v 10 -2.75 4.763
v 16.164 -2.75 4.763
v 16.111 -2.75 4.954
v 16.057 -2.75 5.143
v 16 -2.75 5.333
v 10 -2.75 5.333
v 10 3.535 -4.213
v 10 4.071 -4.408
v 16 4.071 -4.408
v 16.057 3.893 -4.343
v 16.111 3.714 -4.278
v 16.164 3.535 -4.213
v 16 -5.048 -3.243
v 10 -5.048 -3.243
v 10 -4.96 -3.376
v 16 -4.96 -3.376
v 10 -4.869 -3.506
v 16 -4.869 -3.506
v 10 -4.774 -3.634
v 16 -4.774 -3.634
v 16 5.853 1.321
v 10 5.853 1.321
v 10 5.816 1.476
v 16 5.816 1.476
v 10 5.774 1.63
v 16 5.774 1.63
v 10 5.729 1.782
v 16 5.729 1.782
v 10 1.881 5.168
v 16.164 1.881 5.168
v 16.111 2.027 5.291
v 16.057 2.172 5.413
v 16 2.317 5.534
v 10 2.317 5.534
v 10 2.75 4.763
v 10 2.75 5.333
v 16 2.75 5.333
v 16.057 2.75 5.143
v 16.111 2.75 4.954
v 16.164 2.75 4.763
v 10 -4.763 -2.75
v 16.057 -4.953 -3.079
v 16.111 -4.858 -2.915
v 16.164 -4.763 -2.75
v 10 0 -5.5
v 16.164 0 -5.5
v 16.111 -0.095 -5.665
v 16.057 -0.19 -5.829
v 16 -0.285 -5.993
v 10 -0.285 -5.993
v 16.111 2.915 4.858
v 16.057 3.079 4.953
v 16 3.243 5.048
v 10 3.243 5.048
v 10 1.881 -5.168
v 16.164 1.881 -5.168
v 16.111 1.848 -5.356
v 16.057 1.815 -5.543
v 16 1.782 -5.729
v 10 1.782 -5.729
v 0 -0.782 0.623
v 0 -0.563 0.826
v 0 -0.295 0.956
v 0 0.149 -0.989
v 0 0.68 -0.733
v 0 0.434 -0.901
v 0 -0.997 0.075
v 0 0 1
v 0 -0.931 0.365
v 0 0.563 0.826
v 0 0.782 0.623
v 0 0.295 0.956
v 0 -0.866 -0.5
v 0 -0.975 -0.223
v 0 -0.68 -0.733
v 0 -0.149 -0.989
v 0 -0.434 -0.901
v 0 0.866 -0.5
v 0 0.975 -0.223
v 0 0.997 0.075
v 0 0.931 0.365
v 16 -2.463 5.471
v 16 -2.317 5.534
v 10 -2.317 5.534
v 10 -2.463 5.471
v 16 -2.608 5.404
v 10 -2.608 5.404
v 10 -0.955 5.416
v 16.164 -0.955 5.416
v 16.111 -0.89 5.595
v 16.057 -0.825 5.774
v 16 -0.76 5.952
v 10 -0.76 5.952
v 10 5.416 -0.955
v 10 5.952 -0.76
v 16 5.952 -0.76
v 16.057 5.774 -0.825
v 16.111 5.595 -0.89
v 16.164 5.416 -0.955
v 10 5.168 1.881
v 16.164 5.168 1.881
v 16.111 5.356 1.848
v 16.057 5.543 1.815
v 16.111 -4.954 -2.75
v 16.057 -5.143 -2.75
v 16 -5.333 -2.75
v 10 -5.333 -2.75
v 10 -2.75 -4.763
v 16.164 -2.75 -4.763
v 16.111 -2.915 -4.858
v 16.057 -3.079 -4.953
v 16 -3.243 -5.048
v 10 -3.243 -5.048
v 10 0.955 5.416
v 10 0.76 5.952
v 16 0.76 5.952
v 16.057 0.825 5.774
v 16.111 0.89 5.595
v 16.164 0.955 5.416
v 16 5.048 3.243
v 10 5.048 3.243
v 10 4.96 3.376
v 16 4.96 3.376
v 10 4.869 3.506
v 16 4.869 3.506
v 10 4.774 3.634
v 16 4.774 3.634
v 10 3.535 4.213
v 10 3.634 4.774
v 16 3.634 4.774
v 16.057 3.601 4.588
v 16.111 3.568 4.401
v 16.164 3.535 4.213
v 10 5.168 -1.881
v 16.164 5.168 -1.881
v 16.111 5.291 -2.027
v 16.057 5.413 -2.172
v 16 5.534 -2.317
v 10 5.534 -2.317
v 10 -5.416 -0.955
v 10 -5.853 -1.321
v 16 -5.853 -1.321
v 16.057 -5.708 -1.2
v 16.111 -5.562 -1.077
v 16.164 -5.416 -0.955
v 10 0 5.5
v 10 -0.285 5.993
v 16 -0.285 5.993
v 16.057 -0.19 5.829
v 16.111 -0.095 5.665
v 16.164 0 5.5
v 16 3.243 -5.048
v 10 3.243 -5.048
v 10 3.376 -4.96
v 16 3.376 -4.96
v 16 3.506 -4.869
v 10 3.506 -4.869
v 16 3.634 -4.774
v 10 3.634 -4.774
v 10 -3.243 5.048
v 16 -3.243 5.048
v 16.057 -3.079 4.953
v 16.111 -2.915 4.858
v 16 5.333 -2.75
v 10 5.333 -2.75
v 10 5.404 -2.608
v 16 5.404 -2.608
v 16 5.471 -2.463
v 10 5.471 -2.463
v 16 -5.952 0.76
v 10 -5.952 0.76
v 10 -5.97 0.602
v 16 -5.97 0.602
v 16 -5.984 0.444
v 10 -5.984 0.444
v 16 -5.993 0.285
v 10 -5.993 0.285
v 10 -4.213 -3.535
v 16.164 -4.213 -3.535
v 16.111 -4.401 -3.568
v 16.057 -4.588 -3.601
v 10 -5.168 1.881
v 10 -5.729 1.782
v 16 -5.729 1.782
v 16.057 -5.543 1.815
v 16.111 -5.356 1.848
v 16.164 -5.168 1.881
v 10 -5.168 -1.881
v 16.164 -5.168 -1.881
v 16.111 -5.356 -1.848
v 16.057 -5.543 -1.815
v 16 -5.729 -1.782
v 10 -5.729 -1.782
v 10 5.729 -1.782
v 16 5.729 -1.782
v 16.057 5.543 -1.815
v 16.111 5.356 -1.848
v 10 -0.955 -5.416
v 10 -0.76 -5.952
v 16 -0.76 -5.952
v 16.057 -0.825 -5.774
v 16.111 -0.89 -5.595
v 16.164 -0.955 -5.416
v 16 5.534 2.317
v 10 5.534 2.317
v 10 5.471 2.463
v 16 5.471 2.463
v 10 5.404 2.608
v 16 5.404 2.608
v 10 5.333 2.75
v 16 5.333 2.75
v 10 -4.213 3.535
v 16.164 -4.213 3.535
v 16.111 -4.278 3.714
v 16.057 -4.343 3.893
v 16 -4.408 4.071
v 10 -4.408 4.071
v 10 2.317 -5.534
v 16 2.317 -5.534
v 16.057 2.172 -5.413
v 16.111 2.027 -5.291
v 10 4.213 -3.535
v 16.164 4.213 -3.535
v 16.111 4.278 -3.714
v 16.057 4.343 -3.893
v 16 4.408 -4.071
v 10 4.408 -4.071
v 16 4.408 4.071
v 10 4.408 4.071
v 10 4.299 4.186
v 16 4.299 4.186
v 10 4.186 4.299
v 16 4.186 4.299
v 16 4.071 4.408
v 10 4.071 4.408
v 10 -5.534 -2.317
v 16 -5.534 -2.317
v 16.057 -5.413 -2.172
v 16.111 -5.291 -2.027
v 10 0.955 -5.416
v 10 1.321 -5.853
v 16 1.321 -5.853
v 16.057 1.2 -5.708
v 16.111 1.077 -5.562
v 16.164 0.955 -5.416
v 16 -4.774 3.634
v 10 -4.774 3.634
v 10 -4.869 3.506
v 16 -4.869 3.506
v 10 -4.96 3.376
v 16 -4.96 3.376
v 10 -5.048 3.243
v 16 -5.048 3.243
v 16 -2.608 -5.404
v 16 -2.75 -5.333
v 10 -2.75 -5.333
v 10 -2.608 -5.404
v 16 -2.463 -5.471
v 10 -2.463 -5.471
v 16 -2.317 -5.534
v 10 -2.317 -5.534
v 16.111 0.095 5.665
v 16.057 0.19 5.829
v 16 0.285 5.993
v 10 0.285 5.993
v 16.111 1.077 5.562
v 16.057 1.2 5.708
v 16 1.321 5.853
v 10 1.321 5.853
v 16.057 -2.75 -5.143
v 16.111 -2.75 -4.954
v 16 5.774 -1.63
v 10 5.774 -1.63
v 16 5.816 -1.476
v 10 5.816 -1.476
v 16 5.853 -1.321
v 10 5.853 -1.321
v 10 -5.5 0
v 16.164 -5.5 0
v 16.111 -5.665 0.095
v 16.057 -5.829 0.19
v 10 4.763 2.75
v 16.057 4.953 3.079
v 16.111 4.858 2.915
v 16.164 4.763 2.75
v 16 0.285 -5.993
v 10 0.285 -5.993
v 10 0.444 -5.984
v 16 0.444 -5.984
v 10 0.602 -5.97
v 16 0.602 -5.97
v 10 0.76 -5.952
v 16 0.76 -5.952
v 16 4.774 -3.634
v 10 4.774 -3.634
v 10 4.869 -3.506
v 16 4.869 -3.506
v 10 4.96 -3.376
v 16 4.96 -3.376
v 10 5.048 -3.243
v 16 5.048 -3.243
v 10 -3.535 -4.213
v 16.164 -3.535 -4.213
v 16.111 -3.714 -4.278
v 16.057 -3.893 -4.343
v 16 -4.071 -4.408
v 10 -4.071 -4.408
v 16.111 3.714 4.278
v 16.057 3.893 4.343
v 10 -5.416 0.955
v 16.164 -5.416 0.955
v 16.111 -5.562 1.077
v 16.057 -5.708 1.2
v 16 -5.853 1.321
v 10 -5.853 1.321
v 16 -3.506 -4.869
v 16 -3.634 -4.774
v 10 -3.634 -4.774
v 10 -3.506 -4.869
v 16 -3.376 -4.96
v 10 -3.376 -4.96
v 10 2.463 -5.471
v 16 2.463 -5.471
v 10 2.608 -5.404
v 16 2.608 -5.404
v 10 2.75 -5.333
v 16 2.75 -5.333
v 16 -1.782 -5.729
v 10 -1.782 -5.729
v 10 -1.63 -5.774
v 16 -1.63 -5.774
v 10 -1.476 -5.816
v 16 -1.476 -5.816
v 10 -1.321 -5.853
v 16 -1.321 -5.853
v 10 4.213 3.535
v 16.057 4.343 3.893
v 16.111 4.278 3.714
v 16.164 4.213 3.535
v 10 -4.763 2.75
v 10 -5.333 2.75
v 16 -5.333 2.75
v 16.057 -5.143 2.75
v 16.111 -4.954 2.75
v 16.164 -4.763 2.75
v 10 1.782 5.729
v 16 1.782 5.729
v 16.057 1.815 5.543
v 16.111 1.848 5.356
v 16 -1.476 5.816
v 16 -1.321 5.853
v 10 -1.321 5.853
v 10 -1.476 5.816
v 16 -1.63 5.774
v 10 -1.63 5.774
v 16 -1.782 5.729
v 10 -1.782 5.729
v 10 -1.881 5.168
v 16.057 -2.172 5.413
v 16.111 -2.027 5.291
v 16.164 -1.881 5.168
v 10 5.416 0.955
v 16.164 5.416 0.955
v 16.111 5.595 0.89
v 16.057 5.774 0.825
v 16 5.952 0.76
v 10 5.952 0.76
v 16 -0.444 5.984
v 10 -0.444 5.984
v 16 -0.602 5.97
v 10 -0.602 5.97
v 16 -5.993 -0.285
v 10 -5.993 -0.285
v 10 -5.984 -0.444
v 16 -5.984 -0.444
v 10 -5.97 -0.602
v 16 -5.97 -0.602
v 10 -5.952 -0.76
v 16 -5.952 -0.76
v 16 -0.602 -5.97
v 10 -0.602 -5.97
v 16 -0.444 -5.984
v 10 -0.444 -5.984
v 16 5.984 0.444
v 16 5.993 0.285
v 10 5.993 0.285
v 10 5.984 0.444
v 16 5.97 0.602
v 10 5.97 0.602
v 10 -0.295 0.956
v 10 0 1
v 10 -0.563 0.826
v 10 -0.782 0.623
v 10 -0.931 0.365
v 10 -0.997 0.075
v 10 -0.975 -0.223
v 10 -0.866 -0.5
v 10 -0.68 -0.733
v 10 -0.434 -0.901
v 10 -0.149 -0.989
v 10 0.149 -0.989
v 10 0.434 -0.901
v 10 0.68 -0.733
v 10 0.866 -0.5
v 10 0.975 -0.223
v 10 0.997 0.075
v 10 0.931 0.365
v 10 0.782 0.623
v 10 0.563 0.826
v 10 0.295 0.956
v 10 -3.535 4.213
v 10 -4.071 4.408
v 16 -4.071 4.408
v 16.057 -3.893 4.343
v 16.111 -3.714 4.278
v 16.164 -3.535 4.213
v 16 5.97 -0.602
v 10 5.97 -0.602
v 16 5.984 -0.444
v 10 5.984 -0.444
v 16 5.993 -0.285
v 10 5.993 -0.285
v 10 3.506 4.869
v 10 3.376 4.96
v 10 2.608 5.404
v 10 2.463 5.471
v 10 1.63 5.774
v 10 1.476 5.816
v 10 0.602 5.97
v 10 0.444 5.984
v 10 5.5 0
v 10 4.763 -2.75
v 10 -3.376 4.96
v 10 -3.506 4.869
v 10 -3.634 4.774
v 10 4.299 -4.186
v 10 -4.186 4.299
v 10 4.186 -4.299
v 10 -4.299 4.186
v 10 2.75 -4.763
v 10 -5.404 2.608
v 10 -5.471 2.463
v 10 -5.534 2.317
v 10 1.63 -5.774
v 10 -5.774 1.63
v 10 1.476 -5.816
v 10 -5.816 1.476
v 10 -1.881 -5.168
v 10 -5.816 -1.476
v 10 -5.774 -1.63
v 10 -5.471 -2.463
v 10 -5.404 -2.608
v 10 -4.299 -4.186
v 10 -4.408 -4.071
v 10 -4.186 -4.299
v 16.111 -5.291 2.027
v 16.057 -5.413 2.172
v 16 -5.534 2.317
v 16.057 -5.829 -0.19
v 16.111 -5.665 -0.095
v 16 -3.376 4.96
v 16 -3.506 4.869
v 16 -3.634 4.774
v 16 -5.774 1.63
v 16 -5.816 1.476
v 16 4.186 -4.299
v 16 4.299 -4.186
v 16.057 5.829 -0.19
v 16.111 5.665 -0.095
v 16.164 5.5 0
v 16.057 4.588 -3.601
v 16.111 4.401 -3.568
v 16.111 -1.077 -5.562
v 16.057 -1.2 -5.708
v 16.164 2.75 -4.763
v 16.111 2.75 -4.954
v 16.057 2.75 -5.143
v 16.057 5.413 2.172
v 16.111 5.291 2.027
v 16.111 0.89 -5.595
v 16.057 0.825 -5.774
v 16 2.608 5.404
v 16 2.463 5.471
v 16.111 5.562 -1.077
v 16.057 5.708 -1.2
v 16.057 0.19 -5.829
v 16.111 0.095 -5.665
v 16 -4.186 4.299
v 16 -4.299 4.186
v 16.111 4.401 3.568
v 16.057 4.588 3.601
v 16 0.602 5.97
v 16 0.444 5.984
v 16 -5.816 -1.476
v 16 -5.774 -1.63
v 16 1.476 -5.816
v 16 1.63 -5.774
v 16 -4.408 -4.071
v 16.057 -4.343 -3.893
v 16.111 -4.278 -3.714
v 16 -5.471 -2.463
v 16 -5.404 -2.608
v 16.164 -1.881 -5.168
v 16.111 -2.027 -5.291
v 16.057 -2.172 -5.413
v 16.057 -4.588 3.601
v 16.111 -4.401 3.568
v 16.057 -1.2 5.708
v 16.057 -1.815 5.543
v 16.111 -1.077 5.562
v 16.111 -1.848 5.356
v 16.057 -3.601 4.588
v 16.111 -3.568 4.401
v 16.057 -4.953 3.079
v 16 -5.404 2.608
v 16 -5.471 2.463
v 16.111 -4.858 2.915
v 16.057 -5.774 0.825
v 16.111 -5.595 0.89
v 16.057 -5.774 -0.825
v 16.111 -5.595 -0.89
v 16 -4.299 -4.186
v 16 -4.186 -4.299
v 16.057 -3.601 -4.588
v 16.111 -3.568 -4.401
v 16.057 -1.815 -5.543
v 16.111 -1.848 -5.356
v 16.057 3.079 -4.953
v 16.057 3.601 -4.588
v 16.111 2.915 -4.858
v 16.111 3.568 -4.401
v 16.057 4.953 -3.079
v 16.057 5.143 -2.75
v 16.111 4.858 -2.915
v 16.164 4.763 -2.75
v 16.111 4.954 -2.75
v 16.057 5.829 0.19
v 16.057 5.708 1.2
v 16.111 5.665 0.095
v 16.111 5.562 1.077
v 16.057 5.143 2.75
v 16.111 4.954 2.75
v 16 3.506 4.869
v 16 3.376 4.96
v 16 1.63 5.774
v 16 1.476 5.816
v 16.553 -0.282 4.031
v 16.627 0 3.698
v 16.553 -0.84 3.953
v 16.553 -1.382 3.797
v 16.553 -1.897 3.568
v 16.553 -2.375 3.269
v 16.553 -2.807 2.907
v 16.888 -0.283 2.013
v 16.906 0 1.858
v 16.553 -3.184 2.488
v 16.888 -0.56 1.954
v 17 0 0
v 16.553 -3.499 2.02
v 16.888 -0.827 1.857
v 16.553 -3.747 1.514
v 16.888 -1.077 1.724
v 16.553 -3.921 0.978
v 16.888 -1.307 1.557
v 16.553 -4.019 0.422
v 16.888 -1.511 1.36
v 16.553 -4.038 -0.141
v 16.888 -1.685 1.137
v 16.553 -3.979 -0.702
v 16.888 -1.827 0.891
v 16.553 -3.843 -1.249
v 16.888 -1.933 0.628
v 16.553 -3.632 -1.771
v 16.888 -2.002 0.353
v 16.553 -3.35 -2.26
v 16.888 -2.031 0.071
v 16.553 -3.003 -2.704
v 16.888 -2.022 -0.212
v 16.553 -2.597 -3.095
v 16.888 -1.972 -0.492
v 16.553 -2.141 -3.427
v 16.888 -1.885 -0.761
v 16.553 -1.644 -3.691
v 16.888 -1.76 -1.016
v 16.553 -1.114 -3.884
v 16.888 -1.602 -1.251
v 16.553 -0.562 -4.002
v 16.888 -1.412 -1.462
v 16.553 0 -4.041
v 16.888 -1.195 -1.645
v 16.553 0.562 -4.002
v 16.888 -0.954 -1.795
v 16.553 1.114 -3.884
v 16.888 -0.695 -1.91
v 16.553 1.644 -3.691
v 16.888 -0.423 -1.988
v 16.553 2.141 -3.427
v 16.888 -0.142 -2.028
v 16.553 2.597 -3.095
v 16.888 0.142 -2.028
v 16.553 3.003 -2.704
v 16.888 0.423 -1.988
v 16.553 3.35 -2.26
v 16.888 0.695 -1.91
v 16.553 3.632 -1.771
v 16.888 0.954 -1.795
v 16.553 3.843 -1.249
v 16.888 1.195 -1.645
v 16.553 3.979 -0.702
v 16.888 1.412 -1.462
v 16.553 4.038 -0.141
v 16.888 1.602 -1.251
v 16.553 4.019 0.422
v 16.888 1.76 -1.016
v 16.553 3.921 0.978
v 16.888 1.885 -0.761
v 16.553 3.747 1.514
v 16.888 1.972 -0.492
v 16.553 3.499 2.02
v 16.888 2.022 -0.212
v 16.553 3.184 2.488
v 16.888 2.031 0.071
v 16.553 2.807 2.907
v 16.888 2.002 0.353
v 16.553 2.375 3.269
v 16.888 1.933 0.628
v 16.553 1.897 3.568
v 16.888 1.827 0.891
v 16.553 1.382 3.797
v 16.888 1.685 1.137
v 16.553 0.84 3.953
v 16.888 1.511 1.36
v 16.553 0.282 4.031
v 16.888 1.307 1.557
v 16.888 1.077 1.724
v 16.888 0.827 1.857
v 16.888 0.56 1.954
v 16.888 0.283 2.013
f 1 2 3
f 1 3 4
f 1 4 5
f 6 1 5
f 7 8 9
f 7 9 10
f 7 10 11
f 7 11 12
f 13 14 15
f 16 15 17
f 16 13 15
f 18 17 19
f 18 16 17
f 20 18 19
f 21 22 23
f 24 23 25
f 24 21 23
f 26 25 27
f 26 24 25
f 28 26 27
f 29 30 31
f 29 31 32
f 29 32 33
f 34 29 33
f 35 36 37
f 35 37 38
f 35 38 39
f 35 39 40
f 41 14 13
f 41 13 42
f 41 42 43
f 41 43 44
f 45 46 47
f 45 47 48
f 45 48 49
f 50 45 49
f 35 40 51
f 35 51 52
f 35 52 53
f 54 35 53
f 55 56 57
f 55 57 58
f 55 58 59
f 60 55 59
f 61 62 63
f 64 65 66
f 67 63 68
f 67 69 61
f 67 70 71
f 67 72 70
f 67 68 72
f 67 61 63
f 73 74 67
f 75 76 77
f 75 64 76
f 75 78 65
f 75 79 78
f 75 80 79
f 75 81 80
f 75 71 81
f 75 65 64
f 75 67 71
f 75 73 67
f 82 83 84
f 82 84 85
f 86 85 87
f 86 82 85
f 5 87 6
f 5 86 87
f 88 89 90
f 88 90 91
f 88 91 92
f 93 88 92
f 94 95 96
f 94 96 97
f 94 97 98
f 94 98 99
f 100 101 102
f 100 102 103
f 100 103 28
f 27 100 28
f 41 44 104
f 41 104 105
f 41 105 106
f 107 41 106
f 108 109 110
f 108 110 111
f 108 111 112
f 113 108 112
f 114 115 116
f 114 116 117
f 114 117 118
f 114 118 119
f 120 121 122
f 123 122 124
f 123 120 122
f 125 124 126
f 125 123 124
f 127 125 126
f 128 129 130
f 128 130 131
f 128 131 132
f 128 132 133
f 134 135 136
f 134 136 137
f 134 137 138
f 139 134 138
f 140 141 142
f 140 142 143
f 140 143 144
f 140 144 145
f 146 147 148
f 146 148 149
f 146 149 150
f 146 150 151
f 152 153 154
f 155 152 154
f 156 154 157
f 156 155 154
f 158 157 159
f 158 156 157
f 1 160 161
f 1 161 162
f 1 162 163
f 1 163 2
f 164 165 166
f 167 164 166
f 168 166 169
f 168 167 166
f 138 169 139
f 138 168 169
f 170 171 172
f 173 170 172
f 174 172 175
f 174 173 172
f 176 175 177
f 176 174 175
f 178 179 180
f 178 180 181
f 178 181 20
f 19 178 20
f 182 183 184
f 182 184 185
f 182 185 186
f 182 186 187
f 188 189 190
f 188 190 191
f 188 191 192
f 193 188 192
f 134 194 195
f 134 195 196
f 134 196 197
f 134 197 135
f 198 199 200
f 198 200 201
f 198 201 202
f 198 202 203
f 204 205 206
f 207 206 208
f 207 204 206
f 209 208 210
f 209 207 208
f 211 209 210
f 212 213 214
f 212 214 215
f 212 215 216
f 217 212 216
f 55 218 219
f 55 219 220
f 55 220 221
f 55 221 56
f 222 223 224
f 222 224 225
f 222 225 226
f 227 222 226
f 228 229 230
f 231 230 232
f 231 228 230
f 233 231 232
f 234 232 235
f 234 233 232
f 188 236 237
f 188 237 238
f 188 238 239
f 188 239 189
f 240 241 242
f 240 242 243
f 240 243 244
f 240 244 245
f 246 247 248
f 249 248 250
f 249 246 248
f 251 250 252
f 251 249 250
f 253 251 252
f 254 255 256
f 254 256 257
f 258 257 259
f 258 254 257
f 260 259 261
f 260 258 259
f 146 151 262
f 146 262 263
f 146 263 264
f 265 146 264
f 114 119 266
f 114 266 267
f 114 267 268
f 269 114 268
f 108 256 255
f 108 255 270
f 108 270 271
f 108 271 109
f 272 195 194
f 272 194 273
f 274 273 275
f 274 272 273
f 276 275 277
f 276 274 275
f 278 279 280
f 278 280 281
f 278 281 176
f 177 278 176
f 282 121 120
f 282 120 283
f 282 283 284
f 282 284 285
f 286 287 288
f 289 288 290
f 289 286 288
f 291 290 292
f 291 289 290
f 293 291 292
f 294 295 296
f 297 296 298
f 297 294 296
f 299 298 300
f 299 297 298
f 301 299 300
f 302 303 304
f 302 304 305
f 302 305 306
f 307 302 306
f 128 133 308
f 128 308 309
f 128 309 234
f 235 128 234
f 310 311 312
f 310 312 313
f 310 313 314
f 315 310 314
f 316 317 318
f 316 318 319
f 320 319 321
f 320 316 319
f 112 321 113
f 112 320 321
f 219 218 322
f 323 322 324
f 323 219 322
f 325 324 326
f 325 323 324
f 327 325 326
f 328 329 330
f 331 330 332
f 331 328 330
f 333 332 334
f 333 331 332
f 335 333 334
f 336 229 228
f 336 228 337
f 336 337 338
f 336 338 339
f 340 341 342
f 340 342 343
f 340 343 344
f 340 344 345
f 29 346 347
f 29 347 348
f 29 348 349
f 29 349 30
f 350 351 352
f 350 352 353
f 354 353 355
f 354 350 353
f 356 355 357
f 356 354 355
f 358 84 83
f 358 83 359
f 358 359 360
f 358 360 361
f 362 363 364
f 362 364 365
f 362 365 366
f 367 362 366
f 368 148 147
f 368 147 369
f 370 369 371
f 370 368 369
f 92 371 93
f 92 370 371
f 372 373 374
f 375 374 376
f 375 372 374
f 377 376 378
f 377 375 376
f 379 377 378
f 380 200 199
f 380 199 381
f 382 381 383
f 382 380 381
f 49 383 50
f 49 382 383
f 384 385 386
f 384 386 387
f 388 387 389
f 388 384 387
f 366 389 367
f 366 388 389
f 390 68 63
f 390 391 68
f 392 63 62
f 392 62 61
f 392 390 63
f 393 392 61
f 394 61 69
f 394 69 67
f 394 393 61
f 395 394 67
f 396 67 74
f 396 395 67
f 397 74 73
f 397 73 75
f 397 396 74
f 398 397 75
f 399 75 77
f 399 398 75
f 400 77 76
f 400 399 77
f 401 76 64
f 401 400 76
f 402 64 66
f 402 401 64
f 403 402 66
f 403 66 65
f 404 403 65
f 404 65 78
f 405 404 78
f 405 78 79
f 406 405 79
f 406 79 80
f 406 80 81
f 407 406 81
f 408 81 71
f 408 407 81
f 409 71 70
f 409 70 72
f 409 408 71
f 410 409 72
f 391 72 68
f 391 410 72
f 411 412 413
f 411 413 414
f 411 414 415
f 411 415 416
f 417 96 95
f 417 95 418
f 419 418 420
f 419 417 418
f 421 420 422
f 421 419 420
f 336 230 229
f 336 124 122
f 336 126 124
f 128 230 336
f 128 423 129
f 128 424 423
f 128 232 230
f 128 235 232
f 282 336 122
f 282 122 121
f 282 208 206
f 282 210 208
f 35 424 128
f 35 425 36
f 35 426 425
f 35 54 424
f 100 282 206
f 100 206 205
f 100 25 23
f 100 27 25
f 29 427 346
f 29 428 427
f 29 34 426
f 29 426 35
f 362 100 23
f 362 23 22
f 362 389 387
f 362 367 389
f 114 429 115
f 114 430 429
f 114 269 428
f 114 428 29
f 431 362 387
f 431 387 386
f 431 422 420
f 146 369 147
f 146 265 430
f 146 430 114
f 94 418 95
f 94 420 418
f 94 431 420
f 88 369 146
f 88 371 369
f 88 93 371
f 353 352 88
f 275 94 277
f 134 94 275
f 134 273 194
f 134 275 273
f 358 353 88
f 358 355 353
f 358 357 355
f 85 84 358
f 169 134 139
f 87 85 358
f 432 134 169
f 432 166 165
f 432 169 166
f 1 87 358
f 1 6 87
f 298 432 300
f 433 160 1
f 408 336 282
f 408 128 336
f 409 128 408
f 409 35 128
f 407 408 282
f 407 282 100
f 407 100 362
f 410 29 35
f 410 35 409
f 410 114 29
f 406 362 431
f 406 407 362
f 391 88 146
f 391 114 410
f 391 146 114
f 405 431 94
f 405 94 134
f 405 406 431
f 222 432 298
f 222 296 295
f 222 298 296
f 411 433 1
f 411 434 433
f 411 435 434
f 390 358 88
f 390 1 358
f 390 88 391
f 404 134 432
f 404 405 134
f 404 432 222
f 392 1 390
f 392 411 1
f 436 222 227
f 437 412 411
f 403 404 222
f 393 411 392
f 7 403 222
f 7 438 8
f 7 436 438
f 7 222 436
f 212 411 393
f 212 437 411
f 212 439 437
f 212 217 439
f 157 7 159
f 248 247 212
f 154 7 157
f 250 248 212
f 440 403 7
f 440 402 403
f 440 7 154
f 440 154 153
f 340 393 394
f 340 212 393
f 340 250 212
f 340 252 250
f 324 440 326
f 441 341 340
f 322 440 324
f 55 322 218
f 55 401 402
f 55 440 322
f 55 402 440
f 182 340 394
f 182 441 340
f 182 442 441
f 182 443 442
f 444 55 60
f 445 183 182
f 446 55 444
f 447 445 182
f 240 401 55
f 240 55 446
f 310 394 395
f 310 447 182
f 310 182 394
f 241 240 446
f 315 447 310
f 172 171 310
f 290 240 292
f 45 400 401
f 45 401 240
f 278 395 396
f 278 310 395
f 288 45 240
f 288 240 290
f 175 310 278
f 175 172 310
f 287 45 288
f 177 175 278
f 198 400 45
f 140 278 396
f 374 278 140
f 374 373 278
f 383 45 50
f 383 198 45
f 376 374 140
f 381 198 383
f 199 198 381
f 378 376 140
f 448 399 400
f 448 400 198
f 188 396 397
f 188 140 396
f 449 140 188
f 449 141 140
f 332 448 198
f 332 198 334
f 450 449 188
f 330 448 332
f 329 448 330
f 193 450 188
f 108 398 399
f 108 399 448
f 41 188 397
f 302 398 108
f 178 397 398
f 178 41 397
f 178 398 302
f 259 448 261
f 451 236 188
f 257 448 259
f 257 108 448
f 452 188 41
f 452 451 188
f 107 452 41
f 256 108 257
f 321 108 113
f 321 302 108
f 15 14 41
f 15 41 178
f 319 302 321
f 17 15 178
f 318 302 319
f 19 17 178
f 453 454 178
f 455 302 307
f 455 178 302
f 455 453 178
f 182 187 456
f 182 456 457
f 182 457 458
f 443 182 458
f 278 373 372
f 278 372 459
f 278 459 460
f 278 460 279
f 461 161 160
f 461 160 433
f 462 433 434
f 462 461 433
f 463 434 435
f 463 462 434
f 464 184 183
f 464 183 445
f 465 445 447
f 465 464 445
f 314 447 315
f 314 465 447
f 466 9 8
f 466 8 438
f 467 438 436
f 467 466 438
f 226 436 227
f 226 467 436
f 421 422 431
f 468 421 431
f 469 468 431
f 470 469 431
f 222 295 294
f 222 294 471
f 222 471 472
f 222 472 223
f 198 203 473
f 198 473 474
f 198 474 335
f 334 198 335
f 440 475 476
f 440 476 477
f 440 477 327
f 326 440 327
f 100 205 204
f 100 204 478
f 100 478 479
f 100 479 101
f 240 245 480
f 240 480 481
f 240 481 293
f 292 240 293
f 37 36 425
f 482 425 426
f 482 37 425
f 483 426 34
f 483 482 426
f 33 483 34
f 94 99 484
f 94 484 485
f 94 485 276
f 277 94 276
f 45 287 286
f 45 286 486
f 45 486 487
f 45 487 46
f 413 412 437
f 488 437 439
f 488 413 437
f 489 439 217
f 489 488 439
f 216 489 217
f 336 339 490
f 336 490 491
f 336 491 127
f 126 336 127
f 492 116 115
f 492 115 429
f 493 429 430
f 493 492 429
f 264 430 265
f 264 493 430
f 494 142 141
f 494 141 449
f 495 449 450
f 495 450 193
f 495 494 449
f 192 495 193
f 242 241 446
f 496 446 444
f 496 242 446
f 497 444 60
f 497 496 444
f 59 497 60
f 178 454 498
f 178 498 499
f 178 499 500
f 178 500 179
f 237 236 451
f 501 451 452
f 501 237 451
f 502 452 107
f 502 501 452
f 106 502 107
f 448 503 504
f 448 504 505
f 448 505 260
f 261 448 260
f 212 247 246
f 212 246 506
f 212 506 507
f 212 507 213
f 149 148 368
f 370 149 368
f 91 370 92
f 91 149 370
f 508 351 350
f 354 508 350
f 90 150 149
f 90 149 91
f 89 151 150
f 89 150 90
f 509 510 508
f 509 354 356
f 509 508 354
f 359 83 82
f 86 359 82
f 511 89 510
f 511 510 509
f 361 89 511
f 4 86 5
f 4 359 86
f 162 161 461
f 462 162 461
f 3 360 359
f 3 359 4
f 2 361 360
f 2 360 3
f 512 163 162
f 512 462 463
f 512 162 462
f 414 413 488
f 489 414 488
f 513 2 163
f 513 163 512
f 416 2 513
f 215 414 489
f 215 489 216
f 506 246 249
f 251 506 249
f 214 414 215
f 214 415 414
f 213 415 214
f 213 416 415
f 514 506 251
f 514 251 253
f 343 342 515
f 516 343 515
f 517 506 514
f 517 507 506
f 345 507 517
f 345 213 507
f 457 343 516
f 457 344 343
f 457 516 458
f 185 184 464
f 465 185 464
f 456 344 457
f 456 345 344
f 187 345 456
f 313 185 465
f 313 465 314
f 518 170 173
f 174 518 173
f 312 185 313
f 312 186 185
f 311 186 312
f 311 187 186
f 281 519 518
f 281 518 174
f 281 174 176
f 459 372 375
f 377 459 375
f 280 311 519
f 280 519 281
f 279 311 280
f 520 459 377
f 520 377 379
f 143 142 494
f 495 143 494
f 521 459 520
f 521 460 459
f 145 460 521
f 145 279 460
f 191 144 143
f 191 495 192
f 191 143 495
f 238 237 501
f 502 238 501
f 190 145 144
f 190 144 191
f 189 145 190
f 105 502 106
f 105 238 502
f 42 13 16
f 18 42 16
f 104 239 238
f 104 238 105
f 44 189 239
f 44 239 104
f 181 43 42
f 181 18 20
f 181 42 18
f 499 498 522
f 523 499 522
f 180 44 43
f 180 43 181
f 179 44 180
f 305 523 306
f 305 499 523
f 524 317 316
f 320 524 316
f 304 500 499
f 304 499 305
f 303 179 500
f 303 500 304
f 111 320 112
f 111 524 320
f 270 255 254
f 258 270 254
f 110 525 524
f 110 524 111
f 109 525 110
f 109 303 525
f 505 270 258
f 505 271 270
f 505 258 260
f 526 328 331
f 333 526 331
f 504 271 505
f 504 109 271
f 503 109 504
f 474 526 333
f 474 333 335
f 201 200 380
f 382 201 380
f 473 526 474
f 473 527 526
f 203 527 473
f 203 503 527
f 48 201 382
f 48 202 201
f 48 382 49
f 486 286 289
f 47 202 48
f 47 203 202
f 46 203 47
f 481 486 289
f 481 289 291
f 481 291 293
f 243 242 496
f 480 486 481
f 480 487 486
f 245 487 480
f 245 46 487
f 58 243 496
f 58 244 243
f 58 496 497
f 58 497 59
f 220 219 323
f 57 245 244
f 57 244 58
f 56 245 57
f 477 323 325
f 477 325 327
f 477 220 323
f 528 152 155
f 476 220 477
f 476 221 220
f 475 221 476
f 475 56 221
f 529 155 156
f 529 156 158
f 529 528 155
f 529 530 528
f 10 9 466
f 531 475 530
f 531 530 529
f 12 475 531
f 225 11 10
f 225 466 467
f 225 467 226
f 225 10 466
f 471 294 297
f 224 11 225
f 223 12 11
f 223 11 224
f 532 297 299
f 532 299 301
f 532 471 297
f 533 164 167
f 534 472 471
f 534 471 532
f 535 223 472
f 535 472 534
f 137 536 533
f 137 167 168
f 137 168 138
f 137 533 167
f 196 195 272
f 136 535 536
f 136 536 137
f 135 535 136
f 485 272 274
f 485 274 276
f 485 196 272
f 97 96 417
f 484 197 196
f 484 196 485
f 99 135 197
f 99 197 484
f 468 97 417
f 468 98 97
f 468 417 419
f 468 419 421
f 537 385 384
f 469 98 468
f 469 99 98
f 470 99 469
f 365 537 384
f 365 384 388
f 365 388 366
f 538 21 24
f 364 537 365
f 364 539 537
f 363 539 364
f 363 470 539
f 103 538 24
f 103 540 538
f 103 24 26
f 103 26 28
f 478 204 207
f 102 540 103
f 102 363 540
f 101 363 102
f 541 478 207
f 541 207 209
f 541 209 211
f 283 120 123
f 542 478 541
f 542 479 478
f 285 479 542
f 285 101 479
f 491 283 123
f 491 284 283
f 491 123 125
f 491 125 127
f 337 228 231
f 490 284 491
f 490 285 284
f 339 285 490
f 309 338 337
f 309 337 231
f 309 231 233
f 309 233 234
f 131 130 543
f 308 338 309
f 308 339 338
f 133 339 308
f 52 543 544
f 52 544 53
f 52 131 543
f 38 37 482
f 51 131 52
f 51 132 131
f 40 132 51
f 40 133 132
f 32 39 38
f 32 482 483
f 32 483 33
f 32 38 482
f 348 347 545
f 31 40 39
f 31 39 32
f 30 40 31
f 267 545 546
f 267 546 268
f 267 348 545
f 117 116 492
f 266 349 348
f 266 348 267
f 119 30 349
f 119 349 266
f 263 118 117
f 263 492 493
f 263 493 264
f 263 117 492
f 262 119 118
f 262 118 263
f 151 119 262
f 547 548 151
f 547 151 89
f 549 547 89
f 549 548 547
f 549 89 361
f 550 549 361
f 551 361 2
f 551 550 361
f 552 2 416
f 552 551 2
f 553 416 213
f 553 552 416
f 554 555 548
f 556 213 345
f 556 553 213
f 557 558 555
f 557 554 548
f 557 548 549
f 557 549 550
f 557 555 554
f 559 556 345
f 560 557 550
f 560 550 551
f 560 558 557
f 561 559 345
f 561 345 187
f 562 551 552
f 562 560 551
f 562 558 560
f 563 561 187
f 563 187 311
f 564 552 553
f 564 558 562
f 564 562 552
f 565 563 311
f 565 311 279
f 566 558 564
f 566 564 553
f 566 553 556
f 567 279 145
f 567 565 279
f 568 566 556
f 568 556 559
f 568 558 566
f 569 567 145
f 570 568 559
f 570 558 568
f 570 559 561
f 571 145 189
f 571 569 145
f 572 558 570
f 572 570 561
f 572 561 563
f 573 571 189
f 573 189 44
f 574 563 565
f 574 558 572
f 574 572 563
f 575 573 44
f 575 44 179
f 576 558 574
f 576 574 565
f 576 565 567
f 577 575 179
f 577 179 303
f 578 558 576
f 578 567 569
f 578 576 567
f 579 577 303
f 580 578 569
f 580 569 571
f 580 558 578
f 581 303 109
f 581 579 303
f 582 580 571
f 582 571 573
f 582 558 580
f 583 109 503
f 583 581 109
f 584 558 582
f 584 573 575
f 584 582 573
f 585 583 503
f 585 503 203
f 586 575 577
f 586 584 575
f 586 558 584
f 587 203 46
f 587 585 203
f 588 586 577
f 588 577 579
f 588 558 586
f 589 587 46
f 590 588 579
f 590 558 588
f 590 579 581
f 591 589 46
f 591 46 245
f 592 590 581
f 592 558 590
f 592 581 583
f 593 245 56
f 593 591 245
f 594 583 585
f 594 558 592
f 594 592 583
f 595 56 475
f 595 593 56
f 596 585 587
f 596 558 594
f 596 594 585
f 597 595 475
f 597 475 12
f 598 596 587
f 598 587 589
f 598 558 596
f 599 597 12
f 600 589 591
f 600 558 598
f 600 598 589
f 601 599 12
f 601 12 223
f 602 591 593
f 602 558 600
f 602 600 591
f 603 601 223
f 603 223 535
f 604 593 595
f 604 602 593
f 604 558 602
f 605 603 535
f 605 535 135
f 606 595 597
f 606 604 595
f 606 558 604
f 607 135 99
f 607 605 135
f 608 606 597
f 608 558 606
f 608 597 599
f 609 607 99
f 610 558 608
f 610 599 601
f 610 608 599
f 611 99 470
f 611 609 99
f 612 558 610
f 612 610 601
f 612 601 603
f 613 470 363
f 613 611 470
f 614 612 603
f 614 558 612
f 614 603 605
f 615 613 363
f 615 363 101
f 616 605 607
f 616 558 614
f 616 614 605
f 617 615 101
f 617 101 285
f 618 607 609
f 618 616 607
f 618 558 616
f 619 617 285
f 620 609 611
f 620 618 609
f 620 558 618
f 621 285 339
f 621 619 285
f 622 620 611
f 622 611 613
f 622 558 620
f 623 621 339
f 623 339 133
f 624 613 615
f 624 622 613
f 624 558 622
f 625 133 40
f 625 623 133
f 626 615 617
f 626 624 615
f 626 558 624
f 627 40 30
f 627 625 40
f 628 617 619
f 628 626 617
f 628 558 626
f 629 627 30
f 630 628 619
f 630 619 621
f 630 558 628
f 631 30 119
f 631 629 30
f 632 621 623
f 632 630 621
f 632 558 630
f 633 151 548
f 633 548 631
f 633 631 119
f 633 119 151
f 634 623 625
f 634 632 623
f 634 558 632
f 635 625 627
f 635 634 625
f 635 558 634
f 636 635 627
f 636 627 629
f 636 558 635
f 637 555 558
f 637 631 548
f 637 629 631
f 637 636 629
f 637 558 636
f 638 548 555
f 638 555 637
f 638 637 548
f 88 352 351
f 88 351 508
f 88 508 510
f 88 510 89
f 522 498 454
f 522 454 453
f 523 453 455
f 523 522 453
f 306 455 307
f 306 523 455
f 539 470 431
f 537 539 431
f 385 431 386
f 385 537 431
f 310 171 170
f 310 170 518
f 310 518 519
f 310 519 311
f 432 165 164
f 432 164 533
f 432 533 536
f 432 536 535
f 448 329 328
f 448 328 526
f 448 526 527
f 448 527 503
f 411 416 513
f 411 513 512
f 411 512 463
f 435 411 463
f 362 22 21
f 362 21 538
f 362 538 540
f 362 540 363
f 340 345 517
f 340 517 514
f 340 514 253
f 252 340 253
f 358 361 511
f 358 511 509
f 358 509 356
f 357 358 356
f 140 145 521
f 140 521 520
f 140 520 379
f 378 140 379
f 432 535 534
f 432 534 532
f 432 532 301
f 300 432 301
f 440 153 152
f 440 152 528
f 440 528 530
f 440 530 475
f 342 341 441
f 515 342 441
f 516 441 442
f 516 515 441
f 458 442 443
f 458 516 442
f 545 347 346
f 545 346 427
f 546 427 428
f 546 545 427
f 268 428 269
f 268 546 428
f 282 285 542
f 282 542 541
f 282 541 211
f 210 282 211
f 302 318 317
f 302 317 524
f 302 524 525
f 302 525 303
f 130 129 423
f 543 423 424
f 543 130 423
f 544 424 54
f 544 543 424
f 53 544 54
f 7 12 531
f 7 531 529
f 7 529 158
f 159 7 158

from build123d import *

# Parameters (mm, degrees)
CUT_EXTRUDE1_DEPTH = 22.725560982
CIRPATTERN1_START  = 10
CIRPATTERN1_DEPTH  = 6.163521733


# Read off the part's stored shape, not the designer's step: CirPattern1
with BuildPart() as part:
    # Sketch2 → Revolve1 (revolve)
    with BuildSketch(Plane.XY, mode=Mode.PRIVATE) as revolve1_sk:
        with BuildLine():
            Line((0, 0), (0, 1))
            Line((0, 1), (10, 1))
            Line((10, 1), (10, 6))
            Line((10, 6), (16, 6))
            ThreePointArc((16, 6), (16.748287591, 3.041381265), (17, 0))
            Line((17, 0), (0, 0))
        make_face()
    revolve(revolve1_sk.sketch.rotate(Axis((0, 0, 0), (1, 0, 0)), 90), axis=Axis((0, 0, 0), (1, 0, 0)))

    # Sketch3 → Cut-Extrude1 (cut, through all)
    with BuildSketch(Plane(origin=(20, 0, 0), x_dir=(0, 0, -1), z_dir=(1, 0, 0))):
        with BuildLine():
            Line((0, 5.5), (-0.284771266, 5.9932383))
            ThreePointArc((-0.284771266, 5.9932383), (0, 6), (0.284771266, 5.9932383))
            Line((0.284771266, 5.9932383), (0, 5.5))
        make_face()
    extrude(amount=-CUT_EXTRUDE1_DEPTH, mode=Mode.SUBTRACT)

    # CirPattern1 outline → CirPattern1 (cut)
    with BuildSketch(Plane.YZ.offset(CIRPATTERN1_START)):
        with BuildLine():
            ThreePointArc((-2.75, 5.332682252), (-3, 5.196152423), (-3.2432383, 5.047910986))
            Line((-3.2432383, 5.047910986), (-2.75, 4.763139721))
            Line((-2.75, 4.763139721), (-2.75, 5.332682252))
        make_face()
        with BuildLine():
            Line((5.416442642, -0.955064977), (5.852737532, -1.321159859))
            ThreePointArc((5.852737532, -1.321159859), (5.908846518, -1.041889066), (5.951637555, -0.760269959))
            Line((5.951637555, -0.760269959), (5.416442642, -0.955064977))
        make_face()
        with BuildLine():
            Line((5.168309414, -1.881110788), (5.534404296, -2.317405679))
            ThreePointArc((5.534404296, -2.317405679), (5.638155724, -2.05212086), (5.729199314, -1.782210766))
            Line((5.729199314, -1.782210766), (5.168309414, -1.881110788))
        make_face()
        with BuildLine():
            Line((4.763139721, -2.75), (5.047910986, -3.2432383))
            ThreePointArc((5.047910986, -3.2432383), (5.196152422, -3), (5.332682252, -2.75))
            Line((5.332682252, -2.75), (4.763139721, -2.75))
        make_face()
        with BuildLine():
            Line((4.213244437, -3.535331853), (4.408039455, -4.070526767))
            ThreePointArc((4.408039455, -4.070526767), (4.596266658, -3.856725658), (4.774134337, -3.634231876))
            Line((4.774134337, -3.634231876), (4.213244437, -3.535331853))
        make_face()
        with BuildLine():
            Line((3.535331853, -4.213244437), (3.634231876, -4.774134337))
            ThreePointArc((3.634231876, -4.774134337), (3.856725658, -4.596266658), (4.070526767, -4.408039455))
            Line((4.070526767, -4.408039455), (3.535331853, -4.213244437))
        make_face()
        with BuildLine():
            Line((2.75, -4.763139721), (2.75, -5.332682252))
            ThreePointArc((2.75, -5.332682252), (3, -5.196152422), (3.2432383, -5.047910986))
            Line((3.2432383, -5.047910986), (2.75, -4.763139721))
        make_face()
        with BuildLine():
            Line((1.881110788, -5.168309414), (1.782210766, -5.729199314))
            ThreePointArc((1.782210766, -5.729199314), (2.05212086, -5.638155724), (2.317405679, -5.534404296))
            Line((2.317405679, -5.534404296), (1.881110788, -5.168309414))
        make_face()
        with BuildLine():
            Line((0.955064977, -5.416442642), (0.760269959, -5.951637555))
            ThreePointArc((0.760269959, -5.951637555), (1.041889066, -5.908846518), (1.321159859, -5.852737532))
            Line((1.321159859, -5.852737532), (0.955064977, -5.416442642))
        make_face()
        with BuildLine():
            Line((0, -5.5), (-0.284771266, -5.9932383))
            ThreePointArc((-0.284771266, -5.9932383), (0, -6), (0.284771266, -5.9932383))
            Line((0.284771266, -5.9932383), (0, -5.5))
        make_face()
        with BuildLine():
            Line((-0.955064977, -5.416442642), (-1.321159859, -5.852737533))
            ThreePointArc((-1.321159859, -5.852737533), (-1.041889066, -5.908846518), (-0.760269959, -5.951637555))
            Line((-0.760269959, -5.951637555), (-0.955064977, -5.416442642))
        make_face()
        with BuildLine():
            Line((-1.881110788, -5.168309414), (-2.317405679, -5.534404297))
            ThreePointArc((-2.317405679, -5.534404297), (-2.05212086, -5.638155725), (-1.782210766, -5.729199314))
            Line((-1.782210766, -5.729199314), (-1.881110788, -5.168309414))
        make_face()
        with BuildLine():
            Line((-2.75, -4.763139721), (-3.2432383, -5.047910986))
            ThreePointArc((-3.2432383, -5.047910986), (-3, -5.196152423), (-2.75, -5.332682252))
            Line((-2.75, -5.332682252), (-2.75, -4.763139721))
        make_face()
        with BuildLine():
            Line((-3.535331853, -4.213244437), (-4.070526767, -4.408039455))
            ThreePointArc((-4.070526767, -4.408039455), (-3.856725658, -4.596266658), (-3.634231876, -4.774134337))
            Line((-3.634231876, -4.774134337), (-3.535331853, -4.213244437))
        make_face()
        with BuildLine():
            Line((-4.213244437, -3.535331853), (-4.774134337, -3.634231876))
            ThreePointArc((-4.774134337, -3.634231876), (-4.596266658, -3.856725658), (-4.408039455, -4.070526767))
            Line((-4.408039455, -4.070526767), (-4.213244437, -3.535331853))
        make_face()
        with BuildLine():
            Line((-4.763139721, -2.75), (-5.332682252, -2.75))
            ThreePointArc((-5.332682252, -2.75), (-5.196152423, -3), (-5.047910986, -3.2432383))
            Line((-5.047910986, -3.2432383), (-4.763139721, -2.75))
        make_face()
        with BuildLine():
            Line((-5.168309414, -1.881110788), (-5.729199315, -1.782210766))
            ThreePointArc((-5.729199315, -1.782210766), (-5.638155725, -2.05212086), (-5.534404297, -2.317405679))
            Line((-5.534404297, -2.317405679), (-5.168309414, -1.881110788))
        make_face()
        with BuildLine():
            Line((-5.416442642, -0.955064977), (-5.951637555, -0.760269959))
            ThreePointArc((-5.951637555, -0.760269959), (-5.908846518, -1.041889066), (-5.852737533, -1.321159859))
            Line((-5.852737533, -1.321159859), (-5.416442642, -0.955064977))
        make_face()
        with BuildLine():
            Line((-5.5, 0), (-5.9932383, 0.284771266))
            ThreePointArc((-5.9932383, 0.284771266), (-6, 0), (-5.9932383, -0.284771266))
            Line((-5.9932383, -0.284771266), (-5.5, 0))
        make_face()
        with BuildLine():
            Line((-5.416442642, 0.955064977), (-5.852737533, 1.321159859))
            ThreePointArc((-5.852737533, 1.321159859), (-5.908846518, 1.041889066), (-5.951637555, 0.760269959))
            Line((-5.951637555, 0.760269959), (-5.416442642, 0.955064977))
        make_face()
        with BuildLine():
            Line((-5.168309414, 1.881110788), (-5.534404297, 2.317405679))
            ThreePointArc((-5.534404297, 2.317405679), (-5.638155725, 2.05212086), (-5.729199315, 1.782210766))
            Line((-5.729199315, 1.782210766), (-5.168309414, 1.881110788))
        make_face()
        with BuildLine():
            Line((-4.763139721, 2.75), (-5.047910986, 3.2432383))
            ThreePointArc((-5.047910986, 3.2432383), (-5.196152423, 3), (-5.332682252, 2.75))
            Line((-5.332682252, 2.75), (-4.763139721, 2.75))
        make_face()
        with BuildLine():
            Line((-4.213244437, 3.535331853), (-4.408039455, 4.070526767))
            ThreePointArc((-4.408039455, 4.070526767), (-4.596266658, 3.856725658), (-4.774134337, 3.634231876))
            Line((-4.774134337, 3.634231876), (-4.213244437, 3.535331853))
        make_face()
        with BuildLine():
            Line((-3.535331853, 4.213244437), (-3.634231876, 4.774134337))
            ThreePointArc((-3.634231876, 4.774134337), (-3.856725658, 4.596266658), (-4.070526767, 4.408039455))
            Line((-4.070526767, 4.408039455), (-3.535331853, 4.213244437))
        make_face()
        with BuildLine():
            ThreePointArc((5.951637555, 0.760269959), (5.908846518, 1.041889066), (5.852737532, 1.321159859))
            Line((5.852737532, 1.321159859), (5.416442642, 0.955064977))
            Line((5.416442642, 0.955064977), (5.951637555, 0.760269959))
        make_face()
        with BuildLine():
            ThreePointArc((5.729199314, 1.782210766), (5.638155724, 2.05212086), (5.534404296, 2.317405679))
            Line((5.534404296, 2.317405679), (5.168309414, 1.881110788))
            Line((5.168309414, 1.881110788), (5.729199314, 1.782210766))
        make_face()
        with BuildLine():
            ThreePointArc((5.332682252, 2.75), (5.196152422, 3), (5.047910986, 3.2432383))
            Line((5.047910986, 3.2432383), (4.763139721, 2.75))
            Line((4.763139721, 2.75), (5.332682252, 2.75))
        make_face()
        with BuildLine():
            ThreePointArc((4.774134337, 3.634231876), (4.596266658, 3.856725658), (4.408039455, 4.070526767))
            Line((4.408039455, 4.070526767), (4.213244437, 3.535331853))
            Line((4.213244437, 3.535331853), (4.774134337, 3.634231876))
        make_face()
        with BuildLine():
            ThreePointArc((4.070526767, 4.408039455), (3.856725658, 4.596266658), (3.634231876, 4.774134337))
            Line((3.634231876, 4.774134337), (3.535331853, 4.213244437))
            Line((3.535331853, 4.213244437), (4.070526767, 4.408039455))
        make_face()
        with BuildLine():
            ThreePointArc((3.2432383, 5.047910986), (3, 5.196152422), (2.75, 5.332682252))
            Line((2.75, 5.332682252), (2.75, 4.763139721))
            Line((2.75, 4.763139721), (3.2432383, 5.047910986))
        make_face()
        with BuildLine():
            ThreePointArc((2.317405679, 5.534404296), (2.05212086, 5.638155724), (1.782210766, 5.729199314))
            Line((1.782210766, 5.729199314), (1.881110788, 5.168309414))
            Line((1.881110788, 5.168309414), (2.317405679, 5.534404296))
        make_face()
        with BuildLine():
            ThreePointArc((1.321159859, 5.852737532), (1.041889066, 5.908846518), (0.760269959, 5.951637555))
            Line((0.760269959, 5.951637555), (0.955064977, 5.416442642))
            Line((0.955064977, 5.416442642), (1.321159859, 5.852737532))
        make_face()
        with BuildLine():
            ThreePointArc((0.284771266, 5.9932383), (0, 6), (-0.284771266, 5.9932383))
            Line((-0.284771266, 5.9932383), (0, 5.5))
            Line((0, 5.5), (0.284771266, 5.9932383))
        make_face()
        with BuildLine():
            ThreePointArc((-0.760269959, 5.951637555), (-1.041889066, 5.908846518), (-1.321159859, 5.852737533))
            Line((-1.321159859, 5.852737533), (-0.955064977, 5.416442642))
            Line((-0.955064977, 5.416442642), (-0.760269959, 5.951637555))
        make_face()
        with BuildLine():
            ThreePointArc((-1.782210766, 5.729199314), (-2.05212086, 5.638155725), (-2.317405679, 5.534404297))
            Line((-2.317405679, 5.534404297), (-1.881110788, 5.168309414))
            Line((-1.881110788, 5.168309414), (-1.782210766, 5.729199314))
        make_face()
    extrude(amount=CIRPATTERN1_DEPTH, mode=Mode.SUBTRACT)


solid = part.part
